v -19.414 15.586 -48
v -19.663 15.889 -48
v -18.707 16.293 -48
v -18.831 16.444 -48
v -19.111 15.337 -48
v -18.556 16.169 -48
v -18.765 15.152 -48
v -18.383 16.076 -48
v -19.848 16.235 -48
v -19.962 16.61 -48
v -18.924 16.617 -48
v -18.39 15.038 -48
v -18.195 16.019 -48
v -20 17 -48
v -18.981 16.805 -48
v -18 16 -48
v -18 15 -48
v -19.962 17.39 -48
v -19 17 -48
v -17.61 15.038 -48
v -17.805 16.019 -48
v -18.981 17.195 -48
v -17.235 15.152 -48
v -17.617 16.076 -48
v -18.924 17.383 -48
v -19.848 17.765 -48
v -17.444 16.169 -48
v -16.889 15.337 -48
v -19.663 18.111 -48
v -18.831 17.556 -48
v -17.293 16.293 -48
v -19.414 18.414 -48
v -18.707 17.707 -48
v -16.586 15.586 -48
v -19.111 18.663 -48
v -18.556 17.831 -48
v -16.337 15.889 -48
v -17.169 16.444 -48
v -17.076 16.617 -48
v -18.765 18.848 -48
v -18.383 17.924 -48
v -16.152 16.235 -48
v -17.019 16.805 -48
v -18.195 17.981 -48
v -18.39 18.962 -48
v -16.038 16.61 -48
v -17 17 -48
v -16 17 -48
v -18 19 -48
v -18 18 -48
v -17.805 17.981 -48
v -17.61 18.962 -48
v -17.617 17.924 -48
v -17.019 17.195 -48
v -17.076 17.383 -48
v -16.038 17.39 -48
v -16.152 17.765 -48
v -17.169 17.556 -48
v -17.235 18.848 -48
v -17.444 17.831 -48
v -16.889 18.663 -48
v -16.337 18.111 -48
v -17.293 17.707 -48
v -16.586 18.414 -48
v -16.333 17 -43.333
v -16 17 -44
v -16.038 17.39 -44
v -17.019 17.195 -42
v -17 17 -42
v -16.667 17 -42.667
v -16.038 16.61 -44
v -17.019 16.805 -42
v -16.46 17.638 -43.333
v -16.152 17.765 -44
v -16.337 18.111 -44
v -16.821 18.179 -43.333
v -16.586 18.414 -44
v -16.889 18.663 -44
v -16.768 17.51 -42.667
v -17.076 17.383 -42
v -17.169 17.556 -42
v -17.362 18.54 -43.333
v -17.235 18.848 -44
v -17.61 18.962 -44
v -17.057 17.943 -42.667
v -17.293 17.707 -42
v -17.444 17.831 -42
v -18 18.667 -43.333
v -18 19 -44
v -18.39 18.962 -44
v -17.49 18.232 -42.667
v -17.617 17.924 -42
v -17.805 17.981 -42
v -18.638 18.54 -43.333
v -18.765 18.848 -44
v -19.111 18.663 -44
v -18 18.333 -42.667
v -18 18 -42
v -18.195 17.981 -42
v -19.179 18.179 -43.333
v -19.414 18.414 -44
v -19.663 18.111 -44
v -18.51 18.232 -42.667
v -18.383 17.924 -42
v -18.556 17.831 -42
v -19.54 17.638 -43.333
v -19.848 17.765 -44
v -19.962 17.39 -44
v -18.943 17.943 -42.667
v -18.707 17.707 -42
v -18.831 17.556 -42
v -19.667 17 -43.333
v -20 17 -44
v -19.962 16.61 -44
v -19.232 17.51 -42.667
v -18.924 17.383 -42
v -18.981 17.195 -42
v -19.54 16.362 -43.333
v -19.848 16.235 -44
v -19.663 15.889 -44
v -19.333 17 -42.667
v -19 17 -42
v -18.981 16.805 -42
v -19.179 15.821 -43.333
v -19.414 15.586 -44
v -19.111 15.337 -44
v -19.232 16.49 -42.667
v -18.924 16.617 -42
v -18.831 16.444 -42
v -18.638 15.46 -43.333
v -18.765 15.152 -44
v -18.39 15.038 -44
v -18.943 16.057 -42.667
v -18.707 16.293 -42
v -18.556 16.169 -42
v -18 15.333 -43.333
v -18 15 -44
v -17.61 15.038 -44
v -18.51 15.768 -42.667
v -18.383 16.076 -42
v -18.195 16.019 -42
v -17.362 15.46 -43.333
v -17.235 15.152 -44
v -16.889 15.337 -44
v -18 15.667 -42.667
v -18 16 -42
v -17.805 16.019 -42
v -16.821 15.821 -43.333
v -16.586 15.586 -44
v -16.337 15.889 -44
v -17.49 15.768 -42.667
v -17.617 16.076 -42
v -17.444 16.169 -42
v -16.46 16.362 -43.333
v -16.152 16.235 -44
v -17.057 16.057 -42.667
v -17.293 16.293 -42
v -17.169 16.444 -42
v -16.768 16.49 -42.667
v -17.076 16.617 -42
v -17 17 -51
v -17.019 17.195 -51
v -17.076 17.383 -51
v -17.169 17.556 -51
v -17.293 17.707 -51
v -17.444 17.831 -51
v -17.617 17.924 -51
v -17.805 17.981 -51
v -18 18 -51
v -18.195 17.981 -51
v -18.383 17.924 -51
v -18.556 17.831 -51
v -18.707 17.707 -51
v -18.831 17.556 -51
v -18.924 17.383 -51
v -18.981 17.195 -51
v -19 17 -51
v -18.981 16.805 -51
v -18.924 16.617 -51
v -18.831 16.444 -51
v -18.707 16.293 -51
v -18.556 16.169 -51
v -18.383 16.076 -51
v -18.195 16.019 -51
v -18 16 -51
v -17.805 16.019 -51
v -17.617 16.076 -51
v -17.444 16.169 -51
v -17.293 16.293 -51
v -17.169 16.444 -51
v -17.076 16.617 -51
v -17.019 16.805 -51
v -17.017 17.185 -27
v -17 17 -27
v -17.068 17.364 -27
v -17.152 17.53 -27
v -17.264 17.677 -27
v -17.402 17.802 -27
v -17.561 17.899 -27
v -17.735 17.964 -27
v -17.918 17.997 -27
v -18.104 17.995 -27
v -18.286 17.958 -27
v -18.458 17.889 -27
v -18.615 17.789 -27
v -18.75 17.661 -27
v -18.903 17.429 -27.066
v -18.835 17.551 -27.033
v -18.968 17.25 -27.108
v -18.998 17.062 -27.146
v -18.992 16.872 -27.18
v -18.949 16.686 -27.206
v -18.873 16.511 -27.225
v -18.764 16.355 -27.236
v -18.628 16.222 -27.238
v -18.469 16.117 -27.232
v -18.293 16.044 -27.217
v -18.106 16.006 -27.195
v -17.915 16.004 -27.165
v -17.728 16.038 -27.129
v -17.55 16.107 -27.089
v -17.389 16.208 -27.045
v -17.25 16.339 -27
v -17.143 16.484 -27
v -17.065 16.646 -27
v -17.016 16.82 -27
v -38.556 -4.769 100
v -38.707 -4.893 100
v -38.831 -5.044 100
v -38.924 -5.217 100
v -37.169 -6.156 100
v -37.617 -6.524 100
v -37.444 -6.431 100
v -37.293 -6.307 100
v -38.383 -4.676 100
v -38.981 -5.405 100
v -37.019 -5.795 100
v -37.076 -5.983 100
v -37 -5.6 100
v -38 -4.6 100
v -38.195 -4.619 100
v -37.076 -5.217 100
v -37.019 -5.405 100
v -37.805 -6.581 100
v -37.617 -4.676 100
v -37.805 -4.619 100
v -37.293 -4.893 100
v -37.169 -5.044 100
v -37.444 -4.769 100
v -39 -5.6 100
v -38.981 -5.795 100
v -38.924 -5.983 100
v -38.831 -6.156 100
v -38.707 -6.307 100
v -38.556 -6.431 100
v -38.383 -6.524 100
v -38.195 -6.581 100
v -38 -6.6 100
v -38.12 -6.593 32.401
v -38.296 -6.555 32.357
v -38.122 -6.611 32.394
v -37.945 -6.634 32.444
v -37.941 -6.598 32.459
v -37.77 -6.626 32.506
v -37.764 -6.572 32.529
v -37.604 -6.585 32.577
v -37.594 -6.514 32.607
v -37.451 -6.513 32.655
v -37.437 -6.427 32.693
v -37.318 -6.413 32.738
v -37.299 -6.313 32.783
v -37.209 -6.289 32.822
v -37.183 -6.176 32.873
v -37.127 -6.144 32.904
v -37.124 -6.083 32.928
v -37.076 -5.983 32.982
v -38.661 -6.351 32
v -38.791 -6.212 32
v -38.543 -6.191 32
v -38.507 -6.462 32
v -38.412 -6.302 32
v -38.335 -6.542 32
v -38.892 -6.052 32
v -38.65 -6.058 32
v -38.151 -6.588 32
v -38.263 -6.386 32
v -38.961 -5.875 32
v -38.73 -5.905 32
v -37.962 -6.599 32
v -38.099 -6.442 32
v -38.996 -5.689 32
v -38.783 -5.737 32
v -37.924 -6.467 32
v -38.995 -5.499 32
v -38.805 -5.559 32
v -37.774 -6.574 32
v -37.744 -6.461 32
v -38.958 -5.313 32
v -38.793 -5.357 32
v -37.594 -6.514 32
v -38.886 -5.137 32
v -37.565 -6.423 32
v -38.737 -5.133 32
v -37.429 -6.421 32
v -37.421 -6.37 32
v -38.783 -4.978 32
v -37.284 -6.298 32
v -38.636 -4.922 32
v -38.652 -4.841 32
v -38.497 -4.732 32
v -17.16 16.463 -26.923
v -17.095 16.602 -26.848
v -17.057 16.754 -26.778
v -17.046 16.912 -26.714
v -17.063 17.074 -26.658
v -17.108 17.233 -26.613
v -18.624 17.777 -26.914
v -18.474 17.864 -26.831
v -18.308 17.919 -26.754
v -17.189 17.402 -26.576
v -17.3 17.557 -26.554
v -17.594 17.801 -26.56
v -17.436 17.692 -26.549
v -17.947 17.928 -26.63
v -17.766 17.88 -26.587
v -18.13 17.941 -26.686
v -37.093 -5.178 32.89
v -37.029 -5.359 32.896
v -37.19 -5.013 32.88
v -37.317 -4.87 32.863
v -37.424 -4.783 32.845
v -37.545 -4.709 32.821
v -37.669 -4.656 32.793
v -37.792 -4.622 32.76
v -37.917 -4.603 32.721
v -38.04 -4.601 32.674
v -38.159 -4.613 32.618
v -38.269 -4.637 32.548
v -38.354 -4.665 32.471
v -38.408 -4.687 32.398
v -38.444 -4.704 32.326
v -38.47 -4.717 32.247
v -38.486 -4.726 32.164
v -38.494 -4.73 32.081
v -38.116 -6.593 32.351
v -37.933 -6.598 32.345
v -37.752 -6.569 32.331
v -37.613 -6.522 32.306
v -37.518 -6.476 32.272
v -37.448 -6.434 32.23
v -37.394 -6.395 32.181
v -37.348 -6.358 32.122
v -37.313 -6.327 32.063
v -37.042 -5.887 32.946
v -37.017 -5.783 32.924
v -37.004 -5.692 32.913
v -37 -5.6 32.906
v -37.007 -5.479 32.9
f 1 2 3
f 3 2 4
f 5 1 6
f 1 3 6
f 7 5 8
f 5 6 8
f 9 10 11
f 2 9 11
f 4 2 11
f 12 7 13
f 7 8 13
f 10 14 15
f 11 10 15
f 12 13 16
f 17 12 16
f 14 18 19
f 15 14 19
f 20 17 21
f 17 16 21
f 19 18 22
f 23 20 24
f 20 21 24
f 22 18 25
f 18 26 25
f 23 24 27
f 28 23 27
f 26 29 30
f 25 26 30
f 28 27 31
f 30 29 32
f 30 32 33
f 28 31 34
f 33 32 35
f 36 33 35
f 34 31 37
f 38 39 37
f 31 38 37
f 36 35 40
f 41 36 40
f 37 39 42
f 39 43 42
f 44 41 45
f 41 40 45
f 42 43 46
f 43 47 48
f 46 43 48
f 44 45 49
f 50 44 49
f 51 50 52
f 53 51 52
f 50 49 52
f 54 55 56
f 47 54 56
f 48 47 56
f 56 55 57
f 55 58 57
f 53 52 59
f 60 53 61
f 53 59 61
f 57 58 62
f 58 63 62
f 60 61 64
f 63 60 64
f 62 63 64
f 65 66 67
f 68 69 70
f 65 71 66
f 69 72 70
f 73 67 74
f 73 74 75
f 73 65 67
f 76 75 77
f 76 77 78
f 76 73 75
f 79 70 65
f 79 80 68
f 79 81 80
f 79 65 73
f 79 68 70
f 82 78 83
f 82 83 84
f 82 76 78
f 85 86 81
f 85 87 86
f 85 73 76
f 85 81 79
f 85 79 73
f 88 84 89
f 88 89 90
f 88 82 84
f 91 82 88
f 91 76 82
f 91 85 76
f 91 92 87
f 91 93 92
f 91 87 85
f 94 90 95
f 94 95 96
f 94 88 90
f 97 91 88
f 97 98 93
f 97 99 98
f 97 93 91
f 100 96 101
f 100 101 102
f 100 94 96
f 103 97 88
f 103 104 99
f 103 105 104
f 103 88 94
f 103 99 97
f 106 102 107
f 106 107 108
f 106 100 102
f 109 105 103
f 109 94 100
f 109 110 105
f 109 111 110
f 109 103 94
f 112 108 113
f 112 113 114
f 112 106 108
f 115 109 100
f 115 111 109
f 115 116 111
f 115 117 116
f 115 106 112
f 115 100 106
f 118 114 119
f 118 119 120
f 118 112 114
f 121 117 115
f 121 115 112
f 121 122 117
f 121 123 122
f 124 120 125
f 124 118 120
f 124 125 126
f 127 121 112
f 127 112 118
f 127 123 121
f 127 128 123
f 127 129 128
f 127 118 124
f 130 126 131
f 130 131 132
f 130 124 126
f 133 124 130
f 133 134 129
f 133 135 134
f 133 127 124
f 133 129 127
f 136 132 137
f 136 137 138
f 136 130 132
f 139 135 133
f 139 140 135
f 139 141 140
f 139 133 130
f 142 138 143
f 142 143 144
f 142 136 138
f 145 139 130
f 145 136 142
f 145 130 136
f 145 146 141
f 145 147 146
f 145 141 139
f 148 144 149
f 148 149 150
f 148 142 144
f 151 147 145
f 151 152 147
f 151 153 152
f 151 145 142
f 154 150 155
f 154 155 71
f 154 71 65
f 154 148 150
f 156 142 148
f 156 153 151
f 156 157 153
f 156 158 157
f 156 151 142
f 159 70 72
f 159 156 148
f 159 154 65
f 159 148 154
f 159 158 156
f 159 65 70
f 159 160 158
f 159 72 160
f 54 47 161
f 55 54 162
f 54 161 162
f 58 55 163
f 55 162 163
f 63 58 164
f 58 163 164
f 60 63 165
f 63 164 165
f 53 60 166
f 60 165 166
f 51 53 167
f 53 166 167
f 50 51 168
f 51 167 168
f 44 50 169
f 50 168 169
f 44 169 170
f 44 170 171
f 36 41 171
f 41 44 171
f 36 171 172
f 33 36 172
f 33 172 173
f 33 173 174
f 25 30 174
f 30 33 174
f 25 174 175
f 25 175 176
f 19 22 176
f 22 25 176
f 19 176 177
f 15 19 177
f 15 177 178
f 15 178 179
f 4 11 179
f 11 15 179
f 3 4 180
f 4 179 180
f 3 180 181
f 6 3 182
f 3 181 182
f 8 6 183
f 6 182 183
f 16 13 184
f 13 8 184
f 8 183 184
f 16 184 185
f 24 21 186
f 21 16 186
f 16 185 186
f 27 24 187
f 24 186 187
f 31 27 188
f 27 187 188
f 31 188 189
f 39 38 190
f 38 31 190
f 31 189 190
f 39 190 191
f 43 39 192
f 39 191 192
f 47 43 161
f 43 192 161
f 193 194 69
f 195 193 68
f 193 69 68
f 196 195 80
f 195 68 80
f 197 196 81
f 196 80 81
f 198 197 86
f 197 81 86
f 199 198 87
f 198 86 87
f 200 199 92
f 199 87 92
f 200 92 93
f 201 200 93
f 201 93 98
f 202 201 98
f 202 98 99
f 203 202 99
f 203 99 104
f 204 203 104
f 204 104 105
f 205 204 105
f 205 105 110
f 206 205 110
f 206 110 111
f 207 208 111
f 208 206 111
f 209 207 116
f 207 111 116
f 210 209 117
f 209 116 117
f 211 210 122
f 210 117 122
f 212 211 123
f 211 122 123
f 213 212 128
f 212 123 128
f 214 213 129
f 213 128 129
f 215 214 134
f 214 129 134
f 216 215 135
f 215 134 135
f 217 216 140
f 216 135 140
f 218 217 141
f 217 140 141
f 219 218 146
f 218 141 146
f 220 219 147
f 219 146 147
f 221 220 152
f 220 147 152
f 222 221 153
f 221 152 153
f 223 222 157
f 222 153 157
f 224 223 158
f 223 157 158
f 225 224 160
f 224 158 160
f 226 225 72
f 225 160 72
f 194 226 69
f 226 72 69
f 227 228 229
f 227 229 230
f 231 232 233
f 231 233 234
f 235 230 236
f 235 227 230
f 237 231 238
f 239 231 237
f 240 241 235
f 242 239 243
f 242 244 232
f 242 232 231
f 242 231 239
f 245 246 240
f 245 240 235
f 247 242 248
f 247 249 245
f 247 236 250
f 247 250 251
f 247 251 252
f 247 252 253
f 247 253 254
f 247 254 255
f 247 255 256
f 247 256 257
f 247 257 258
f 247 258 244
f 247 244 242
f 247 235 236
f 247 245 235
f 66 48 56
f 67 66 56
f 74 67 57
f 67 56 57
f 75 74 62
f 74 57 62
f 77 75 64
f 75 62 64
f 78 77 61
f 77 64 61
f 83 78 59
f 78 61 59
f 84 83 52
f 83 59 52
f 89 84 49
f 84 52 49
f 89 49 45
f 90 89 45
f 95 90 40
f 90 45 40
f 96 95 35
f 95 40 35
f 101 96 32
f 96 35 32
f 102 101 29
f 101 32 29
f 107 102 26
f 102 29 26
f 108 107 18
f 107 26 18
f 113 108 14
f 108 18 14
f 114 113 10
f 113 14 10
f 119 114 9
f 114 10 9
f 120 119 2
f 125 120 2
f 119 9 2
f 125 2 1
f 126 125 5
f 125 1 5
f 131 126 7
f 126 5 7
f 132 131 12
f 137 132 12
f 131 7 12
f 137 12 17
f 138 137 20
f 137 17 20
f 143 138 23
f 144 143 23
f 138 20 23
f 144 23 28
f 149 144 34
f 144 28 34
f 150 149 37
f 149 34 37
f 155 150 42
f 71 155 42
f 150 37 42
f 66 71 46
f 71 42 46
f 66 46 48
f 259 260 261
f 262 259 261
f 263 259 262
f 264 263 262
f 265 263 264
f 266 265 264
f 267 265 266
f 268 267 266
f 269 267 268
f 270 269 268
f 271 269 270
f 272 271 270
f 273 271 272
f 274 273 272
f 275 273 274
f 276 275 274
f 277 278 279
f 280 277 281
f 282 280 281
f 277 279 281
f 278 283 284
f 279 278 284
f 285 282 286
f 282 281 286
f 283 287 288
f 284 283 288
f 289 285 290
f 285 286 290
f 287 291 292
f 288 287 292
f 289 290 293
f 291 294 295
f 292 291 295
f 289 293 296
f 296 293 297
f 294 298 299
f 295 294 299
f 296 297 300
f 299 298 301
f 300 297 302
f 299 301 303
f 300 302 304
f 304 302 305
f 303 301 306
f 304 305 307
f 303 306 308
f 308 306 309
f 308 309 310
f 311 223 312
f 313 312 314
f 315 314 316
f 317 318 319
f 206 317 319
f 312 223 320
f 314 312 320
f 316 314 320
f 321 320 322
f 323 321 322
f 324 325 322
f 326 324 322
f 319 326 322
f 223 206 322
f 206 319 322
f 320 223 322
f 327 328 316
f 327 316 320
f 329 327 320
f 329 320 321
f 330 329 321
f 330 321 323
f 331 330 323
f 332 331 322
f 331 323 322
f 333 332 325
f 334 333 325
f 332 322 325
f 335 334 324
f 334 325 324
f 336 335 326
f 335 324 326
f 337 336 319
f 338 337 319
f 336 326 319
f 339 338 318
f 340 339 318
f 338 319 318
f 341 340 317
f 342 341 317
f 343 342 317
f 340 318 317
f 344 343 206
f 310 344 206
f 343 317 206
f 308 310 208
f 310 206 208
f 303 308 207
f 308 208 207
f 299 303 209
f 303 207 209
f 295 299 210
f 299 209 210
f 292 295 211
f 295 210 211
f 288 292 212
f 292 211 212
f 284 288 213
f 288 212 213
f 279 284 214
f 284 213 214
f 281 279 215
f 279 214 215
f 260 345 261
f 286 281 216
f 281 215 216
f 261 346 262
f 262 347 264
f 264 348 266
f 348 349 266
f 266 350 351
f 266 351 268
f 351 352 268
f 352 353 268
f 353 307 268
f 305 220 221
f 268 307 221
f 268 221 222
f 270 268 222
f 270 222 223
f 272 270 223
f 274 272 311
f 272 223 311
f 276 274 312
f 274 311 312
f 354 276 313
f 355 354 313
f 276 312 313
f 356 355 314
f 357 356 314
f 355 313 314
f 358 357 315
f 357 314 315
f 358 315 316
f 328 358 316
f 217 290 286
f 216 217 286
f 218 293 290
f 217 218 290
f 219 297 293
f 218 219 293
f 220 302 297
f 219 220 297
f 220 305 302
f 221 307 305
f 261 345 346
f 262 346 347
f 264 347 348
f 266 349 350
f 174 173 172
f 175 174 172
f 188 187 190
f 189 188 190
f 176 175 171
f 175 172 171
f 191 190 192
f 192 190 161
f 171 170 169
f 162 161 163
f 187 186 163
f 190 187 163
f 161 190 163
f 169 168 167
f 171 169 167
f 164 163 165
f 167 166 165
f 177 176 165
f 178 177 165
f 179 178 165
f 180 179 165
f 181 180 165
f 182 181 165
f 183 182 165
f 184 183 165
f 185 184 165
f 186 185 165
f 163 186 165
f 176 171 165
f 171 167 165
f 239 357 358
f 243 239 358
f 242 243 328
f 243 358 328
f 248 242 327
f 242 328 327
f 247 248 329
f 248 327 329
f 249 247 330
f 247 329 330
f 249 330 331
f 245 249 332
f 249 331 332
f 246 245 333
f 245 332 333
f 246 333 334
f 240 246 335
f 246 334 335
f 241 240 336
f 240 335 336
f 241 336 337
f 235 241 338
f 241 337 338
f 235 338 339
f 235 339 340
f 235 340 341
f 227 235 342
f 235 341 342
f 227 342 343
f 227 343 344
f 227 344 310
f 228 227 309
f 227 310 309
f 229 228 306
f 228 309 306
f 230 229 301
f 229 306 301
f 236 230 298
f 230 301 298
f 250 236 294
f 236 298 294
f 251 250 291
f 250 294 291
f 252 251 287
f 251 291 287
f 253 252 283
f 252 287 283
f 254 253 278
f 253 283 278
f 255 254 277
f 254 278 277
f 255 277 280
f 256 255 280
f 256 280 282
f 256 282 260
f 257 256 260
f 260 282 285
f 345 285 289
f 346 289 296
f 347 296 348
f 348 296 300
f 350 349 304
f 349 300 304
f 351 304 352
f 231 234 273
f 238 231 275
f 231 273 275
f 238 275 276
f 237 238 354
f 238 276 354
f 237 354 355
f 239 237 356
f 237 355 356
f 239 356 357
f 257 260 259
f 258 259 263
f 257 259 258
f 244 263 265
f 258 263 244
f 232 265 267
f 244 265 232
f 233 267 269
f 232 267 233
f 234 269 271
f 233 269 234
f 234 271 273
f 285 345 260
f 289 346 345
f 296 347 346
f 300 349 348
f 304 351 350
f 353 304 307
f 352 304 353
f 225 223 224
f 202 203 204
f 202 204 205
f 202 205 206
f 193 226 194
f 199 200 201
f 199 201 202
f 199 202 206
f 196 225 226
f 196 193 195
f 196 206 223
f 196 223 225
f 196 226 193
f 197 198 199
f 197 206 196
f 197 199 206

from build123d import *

# Parameters (mm, degrees)
CYLINDER071_R               = 1
CYLINDER071_DEPTH           = 16
CYLINDER062_R               = 2
CYLINDER062_DEPTH           = 4
CYLINDER064_R               = 1
CYLINDER064_DEPTH           = 8
CYLINDER069_R               = 1
CYLINDER069_DEPTH           = 67
CYLINDER069_ROLL_ANGLE      = 14.618093
CYLINDER069_PITCH_ANGLE     = -22.769702
CYLINDER069_PLACEMENT_ANGLE = 14.618093
CYLINDER070_R               = 1
CYLINDER070_DEPTH           = 68


with BuildPart() as cylindre067:
    # Cylinder071 → Cylinder071 (new body)
    with BuildSketch(Plane(origin=(-18, 17, -43), x_dir=(1, 0, 0), z_dir=(0, 0, 1))):
        Circle(CYLINDER071_R)
    extrude(amount=CYLINDER071_DEPTH)


with BuildPart() as c_ne002:
    # Cone002 → Cone002 (revolve)
    with BuildSketch(Plane(origin=(-32, 9, -106), x_dir=(1, 0, 0), z_dir=(0, -1, 0))):
        Polygon((0, 0), (2, 0), (1, 2), (0, 2), align=None)
    revolve(axis=Axis((-32, 9, -106), (0, 0, 1)))


with BuildPart() as fusion035:
    # Cylinder062 → Cylinder062 (new body)
    with BuildSketch(Plane(origin=(-32, 9, -110), x_dir=(1, 0, 0), z_dir=(0, 0, 1))):
        Circle(CYLINDER062_R)
    extrude(amount=CYLINDER062_DEPTH)

    # Fusion029: union Cône002
    add(c_ne002.part)


with BuildPart() as fusion035_1:
    # Fusion029 placement: moved
    add(fusion035.part.moved(Location((14, 8, 62))))

    # Fusion035: union Cylindre067
    add(cylindre067.part)


with BuildPart() as fusion036:
    # Cylinder064 → Cylinder064 (new body)
    with BuildSketch(Plane(origin=(-18, 17, -51), x_dir=(1, 0, 0), z_dir=(0, 0, 1))):
        Circle(CYLINDER064_R)
    extrude(amount=CYLINDER064_DEPTH)

    # Fusion036: union Fusion035
    add(fusion035_1.part)


with BuildPart() as fusion037:
    # Cylinder069 → Cylinder069 (new body)
    with BuildSketch(Plane.XY):
        Circle(CYLINDER069_R)
    extrude(amount=CYLINDER069_DEPTH)


with BuildPart() as fusion037_1:
    # Cylinder069 roll: moved
    add(fusion037.part.rotate(Axis((0, 0, 0), (1, 0, 0)), CYLINDER069_ROLL_ANGLE))


with BuildPart() as fusion037_2:
    # Cylinder069 pitch: moved
    add(fusion037_1.part.rotate(Axis((0, 0, 0), (0, 1, 0)), CYLINDER069_PITCH_ANGLE))


with BuildPart() as fusion037_3:
    # Cylinder069 placement: moved
    add(fusion037_2.part.moved(Location((-18, 17, -27))).rotate(Axis((-18, 17, -27), (0, 0, 1)), CYLINDER069_PLACEMENT_ANGLE))

    # Fusion037: union Fusion036
    add(fusion036.part)


with BuildPart() as fusion038:
    # Cylinder070 → Cylinder070 (new body)
    with BuildSketch(Plane(origin=(-38, -5.6, 32), x_dir=(1, 0, 0), z_dir=(0, 0, 1))):
        Circle(CYLINDER070_R)
    extrude(amount=CYLINDER070_DEPTH)

    # Fusion038: union Fusion037
    add(fusion037_3.part)


solid = fusion038.part
